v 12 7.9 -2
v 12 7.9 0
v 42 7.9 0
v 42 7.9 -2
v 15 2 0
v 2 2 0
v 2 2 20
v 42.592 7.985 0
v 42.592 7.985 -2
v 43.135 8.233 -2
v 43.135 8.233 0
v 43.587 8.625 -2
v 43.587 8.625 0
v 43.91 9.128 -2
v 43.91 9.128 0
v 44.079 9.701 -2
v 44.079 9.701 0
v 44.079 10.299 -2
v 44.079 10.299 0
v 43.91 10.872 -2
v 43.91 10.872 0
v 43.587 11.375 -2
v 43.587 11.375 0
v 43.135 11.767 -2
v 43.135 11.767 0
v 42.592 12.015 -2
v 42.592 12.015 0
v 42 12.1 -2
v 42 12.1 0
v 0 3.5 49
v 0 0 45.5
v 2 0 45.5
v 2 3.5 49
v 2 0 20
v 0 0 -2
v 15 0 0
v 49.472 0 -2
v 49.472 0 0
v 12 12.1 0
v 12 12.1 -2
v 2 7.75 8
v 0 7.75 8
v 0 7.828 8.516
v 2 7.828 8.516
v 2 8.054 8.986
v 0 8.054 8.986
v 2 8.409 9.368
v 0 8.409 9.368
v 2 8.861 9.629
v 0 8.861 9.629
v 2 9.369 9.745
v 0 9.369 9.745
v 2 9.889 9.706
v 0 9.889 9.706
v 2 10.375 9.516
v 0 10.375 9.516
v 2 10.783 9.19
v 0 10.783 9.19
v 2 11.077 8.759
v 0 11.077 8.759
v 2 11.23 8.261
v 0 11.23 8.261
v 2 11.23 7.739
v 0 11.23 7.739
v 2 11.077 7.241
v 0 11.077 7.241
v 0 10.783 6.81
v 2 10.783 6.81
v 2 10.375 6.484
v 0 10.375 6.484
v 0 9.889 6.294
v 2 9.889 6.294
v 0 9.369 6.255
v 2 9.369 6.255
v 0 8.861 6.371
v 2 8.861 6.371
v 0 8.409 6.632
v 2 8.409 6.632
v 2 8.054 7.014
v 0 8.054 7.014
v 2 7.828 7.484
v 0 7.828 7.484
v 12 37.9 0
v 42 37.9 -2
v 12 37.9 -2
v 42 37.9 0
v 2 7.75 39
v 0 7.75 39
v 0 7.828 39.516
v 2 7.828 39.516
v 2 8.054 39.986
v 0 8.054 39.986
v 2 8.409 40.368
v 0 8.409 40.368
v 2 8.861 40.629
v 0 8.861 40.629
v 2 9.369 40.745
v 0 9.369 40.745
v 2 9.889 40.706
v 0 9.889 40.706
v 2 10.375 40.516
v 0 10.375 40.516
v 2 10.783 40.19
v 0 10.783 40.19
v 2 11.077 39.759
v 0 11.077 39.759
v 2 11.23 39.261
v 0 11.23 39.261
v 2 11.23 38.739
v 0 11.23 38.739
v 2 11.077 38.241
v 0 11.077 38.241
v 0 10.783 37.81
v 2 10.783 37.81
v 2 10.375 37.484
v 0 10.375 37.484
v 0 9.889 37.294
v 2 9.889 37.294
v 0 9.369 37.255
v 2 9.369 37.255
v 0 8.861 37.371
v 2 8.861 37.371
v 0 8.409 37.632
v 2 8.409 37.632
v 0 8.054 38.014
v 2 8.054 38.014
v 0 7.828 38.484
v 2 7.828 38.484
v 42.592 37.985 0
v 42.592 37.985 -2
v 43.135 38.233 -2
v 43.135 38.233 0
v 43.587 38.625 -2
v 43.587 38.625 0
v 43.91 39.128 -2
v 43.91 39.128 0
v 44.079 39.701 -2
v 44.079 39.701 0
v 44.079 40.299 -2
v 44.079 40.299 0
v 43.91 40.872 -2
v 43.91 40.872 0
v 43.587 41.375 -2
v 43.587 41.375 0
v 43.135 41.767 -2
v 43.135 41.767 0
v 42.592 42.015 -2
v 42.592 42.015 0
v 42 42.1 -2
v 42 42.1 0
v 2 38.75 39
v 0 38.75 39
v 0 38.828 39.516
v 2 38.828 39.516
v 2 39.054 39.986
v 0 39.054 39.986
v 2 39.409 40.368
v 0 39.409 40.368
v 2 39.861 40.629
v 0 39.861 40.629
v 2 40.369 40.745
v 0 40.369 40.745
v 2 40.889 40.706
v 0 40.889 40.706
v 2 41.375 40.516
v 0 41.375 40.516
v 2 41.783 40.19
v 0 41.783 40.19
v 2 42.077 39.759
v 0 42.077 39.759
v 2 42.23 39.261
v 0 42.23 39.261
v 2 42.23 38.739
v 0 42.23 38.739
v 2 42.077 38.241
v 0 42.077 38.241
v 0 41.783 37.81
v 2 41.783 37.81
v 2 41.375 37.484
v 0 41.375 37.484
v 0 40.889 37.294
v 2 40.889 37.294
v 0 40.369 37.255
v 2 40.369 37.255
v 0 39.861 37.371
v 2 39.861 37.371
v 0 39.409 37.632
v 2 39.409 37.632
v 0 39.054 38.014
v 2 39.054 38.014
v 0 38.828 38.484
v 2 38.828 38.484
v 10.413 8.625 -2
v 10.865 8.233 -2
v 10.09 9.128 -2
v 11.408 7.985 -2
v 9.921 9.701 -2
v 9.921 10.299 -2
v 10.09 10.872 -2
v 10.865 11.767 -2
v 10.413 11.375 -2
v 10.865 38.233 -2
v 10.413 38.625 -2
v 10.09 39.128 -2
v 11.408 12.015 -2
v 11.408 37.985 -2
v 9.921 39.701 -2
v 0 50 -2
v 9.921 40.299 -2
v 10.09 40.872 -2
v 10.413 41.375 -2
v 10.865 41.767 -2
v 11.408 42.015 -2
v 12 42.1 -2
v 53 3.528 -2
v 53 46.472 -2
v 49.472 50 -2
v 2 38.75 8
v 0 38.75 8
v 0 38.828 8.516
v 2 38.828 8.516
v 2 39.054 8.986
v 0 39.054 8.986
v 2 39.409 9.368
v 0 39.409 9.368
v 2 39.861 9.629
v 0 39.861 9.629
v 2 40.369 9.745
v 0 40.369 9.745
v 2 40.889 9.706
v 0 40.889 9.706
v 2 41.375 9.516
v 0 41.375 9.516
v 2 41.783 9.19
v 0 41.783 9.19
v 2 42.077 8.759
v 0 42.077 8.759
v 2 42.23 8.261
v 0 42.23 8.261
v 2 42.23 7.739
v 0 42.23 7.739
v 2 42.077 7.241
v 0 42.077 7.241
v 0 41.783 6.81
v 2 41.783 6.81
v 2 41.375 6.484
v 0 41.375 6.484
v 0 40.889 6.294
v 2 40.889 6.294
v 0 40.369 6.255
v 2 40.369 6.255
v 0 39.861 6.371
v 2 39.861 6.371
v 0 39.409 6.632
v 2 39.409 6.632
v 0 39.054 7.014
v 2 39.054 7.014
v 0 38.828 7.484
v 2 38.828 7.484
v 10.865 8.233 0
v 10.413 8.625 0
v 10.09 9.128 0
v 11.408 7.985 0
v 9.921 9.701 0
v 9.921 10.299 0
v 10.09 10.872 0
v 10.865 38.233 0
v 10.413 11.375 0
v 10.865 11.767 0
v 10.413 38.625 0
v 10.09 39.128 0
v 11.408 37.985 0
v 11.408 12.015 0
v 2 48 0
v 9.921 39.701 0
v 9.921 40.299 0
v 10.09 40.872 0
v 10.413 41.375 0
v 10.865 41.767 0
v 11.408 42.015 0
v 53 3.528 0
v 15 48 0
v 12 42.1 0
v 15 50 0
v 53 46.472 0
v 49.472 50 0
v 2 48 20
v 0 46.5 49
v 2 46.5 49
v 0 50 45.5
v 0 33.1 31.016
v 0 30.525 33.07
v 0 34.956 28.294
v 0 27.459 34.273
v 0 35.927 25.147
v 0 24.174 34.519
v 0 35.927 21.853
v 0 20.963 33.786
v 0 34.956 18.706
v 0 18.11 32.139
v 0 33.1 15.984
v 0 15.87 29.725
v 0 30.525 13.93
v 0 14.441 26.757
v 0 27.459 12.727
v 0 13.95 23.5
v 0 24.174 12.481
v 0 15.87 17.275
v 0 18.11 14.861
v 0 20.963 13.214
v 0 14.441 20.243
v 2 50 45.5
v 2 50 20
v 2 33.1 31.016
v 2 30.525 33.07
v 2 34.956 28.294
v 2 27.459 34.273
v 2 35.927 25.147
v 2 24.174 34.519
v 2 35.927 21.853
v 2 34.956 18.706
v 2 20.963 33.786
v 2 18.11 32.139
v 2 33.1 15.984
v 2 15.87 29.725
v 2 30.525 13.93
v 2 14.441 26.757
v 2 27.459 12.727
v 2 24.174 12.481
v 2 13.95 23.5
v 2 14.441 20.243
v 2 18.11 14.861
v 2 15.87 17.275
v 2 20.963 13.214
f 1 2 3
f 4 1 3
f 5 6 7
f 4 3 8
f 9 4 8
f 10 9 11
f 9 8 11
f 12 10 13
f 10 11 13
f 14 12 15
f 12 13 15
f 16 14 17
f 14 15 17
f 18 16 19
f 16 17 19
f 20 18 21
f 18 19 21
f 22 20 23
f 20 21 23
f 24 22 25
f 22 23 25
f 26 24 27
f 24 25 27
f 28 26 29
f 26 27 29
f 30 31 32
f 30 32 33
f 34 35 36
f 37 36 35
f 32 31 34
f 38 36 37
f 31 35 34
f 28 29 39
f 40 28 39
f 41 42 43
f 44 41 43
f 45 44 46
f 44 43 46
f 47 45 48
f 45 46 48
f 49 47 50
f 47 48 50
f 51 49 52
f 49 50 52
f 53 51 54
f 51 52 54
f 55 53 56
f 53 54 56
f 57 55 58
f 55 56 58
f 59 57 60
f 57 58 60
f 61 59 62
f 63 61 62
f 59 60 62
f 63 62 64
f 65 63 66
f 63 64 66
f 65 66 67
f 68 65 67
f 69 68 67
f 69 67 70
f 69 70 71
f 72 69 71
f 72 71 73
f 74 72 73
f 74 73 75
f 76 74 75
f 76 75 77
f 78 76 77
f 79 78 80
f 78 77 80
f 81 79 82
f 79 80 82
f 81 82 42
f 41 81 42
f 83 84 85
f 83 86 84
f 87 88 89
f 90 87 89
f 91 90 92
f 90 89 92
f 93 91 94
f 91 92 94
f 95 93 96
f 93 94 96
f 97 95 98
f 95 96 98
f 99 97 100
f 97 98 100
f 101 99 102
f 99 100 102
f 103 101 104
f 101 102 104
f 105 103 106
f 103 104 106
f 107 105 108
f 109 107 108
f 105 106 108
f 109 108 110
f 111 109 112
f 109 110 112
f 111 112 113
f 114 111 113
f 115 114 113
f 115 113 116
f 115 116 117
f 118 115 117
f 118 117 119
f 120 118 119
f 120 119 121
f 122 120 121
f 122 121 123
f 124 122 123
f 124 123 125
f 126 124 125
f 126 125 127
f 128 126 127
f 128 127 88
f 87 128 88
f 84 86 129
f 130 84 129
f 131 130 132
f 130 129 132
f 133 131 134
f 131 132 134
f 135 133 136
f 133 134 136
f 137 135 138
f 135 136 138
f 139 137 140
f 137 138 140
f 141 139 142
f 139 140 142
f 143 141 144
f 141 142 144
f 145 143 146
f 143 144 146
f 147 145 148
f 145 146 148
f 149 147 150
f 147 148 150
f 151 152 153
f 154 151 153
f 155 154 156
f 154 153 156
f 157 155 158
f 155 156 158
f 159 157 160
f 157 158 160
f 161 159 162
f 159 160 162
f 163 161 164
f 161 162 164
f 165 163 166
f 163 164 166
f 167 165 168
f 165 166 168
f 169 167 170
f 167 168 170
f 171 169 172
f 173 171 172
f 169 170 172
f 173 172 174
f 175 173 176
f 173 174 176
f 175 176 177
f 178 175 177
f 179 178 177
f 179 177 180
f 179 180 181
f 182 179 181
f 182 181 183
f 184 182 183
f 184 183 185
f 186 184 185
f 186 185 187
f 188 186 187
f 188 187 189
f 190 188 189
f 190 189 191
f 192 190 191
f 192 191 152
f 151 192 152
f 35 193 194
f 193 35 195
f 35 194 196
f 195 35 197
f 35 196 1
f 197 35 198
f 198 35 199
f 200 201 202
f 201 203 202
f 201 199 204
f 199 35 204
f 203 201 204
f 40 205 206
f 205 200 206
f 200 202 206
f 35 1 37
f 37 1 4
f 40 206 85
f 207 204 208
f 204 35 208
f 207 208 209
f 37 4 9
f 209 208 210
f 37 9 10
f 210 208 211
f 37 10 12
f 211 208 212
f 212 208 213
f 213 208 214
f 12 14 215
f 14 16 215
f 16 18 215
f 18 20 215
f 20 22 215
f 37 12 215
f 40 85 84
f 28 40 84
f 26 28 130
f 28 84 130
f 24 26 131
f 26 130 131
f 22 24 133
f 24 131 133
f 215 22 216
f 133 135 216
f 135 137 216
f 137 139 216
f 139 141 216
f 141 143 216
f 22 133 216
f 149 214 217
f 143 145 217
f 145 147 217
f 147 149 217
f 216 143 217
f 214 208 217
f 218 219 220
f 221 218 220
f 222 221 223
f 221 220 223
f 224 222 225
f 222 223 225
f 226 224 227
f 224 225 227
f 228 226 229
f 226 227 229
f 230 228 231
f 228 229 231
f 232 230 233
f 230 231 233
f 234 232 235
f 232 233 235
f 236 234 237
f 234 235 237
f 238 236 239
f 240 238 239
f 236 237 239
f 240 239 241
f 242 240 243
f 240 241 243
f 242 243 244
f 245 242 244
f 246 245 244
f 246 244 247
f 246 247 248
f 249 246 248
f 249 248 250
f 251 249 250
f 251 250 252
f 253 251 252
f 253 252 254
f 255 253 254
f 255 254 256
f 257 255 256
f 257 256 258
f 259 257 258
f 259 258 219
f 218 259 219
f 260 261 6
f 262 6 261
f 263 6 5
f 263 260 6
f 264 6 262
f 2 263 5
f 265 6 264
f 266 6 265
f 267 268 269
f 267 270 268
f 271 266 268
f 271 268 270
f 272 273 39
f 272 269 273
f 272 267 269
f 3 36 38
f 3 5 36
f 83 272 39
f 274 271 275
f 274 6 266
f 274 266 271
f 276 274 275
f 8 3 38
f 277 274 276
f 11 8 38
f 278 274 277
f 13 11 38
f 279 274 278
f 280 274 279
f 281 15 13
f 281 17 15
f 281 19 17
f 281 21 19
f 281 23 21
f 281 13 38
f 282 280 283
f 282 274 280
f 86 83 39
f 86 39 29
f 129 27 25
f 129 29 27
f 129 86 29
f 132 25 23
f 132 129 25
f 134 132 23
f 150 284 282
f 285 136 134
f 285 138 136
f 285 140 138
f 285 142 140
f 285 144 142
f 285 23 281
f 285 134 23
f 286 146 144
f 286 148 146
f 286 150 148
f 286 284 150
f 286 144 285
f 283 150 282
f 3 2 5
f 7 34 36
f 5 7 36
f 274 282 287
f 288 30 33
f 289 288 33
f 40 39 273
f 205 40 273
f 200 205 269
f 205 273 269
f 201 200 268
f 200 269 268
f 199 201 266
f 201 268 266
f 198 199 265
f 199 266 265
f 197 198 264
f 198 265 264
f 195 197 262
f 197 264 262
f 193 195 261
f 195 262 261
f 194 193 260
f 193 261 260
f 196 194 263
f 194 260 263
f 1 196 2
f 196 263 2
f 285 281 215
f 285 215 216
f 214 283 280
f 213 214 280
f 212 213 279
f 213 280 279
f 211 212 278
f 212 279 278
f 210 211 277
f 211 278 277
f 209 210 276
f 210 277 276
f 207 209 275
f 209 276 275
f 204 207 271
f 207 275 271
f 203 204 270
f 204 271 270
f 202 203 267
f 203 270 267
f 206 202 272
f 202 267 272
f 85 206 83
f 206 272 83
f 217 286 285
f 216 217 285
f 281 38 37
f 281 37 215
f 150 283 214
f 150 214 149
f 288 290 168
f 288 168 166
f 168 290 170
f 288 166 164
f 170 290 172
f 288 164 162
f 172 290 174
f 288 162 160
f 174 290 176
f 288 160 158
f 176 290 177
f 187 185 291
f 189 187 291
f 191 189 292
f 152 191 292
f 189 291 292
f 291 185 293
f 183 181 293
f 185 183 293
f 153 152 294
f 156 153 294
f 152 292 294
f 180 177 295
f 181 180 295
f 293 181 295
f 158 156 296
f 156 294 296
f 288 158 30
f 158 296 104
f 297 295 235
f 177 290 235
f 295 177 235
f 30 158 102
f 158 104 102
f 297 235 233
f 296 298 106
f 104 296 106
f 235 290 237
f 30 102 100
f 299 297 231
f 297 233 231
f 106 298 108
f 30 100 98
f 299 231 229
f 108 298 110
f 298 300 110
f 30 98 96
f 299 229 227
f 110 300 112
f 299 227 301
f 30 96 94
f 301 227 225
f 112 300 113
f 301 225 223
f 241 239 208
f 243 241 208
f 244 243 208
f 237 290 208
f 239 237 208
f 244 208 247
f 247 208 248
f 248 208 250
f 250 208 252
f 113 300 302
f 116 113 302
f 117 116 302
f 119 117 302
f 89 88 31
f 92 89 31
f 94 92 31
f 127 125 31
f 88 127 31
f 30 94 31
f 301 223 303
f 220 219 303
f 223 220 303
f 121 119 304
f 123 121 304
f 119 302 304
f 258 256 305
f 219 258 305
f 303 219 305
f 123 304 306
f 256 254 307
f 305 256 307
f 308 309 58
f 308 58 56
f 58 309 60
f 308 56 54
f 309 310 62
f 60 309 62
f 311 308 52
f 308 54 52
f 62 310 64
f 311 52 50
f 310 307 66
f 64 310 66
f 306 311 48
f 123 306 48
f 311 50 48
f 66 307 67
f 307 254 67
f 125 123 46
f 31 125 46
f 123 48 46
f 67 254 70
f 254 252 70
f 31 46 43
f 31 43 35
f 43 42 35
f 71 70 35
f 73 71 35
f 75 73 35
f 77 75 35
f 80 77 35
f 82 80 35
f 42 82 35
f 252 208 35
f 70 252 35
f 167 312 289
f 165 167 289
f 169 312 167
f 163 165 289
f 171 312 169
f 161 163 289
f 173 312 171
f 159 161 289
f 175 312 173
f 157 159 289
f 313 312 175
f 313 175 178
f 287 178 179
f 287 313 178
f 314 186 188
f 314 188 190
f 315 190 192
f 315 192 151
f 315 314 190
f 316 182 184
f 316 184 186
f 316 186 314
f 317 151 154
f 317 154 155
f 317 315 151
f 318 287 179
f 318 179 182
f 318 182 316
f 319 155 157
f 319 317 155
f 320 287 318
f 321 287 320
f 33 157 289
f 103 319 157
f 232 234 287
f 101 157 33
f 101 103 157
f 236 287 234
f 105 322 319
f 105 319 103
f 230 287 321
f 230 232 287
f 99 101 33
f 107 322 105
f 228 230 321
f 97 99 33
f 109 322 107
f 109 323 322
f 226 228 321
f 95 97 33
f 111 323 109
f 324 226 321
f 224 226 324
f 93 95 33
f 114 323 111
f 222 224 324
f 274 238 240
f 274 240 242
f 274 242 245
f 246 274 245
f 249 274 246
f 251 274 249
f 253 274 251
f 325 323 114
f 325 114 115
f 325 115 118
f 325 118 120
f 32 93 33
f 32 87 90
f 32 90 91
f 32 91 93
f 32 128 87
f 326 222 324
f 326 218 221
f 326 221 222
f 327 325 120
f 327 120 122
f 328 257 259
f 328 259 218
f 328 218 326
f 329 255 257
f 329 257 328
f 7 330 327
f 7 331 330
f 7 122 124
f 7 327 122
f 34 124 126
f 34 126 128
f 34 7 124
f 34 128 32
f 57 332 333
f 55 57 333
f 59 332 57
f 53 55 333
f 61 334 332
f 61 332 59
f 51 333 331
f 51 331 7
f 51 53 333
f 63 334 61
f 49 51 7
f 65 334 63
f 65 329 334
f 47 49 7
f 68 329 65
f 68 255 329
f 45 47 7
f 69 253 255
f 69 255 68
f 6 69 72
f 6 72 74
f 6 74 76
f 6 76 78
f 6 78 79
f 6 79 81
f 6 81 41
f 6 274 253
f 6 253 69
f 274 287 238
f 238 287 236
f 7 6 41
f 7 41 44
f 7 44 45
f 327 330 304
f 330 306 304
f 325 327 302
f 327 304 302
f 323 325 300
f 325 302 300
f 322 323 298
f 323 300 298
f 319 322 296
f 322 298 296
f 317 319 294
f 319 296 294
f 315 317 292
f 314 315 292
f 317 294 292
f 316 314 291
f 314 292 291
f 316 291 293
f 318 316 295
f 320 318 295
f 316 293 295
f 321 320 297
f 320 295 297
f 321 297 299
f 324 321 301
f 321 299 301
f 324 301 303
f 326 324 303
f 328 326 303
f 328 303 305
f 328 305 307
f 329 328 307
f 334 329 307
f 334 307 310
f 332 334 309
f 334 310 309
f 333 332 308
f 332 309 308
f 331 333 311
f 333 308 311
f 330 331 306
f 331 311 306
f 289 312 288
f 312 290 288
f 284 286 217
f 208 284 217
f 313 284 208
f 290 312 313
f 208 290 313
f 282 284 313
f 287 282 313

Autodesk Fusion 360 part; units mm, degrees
sketch "Sketch1" plane through (0, 0, 0) normal (0, 0, 1) x (1, 0, 0)
  line L0 (0, 0) -> (53, 0)
  line L1 (53, 0) -> (53, 50)
  line L2 (53, 50) -> (0, 50)
  line L3 (0, 50) -> (0, 0)
  line L4 (12, 7.9) -> (42, 7.9)
  arc A0 (42, 7.9) -> (42, 12.1) centre (42, 10) ccw
  line L5 (42, 12.1) -> (12, 12.1)
  arc A1 (12, 12.1) -> (12, 7.9) centre (12, 10) ccw
  line L6 (12, 10) -> (42, 10) construction
  line L7 (0, 25) -> (53, 25) construction
  line L8 (42, 37.9) -> (12, 37.9)
  arc A2 (12, 42.1) -> (12, 37.9) centre (12, 40) ccw
  line L9 (12, 42.1) -> (42, 42.1)
  arc A3 (42, 37.9) -> (42, 42.1) centre (42, 40) ccw
  line L10 (49.4724, 50) -> (53.0079, 46.4645)
  line L11 (49.4724, 50) -> (52.8478, 50) construction
  line L12 (49.4724, 0) -> (53.0079, 3.5355)
  line L13 (0, 50) -> (2, 50)
  line L14 (2, 50) -> (2, 0)
  line L15 (2, 0) -> (0, 0)
  line L16 (0, 0) -> (0, 50)
  dimension "d1" = 53
  dimension "d2" = 50
  dimension "d3" = 4.2
  dimension "d4" = 11
  dimension "d5" = 10
  dimension "d6" = 30
  dimension "d9" = 45
  dimension "d10" = 5
extrude "Extrude1" add sketch "Sketch1" against normal blind 2 contours L0 L2 L3 L13 L14 L15 L16 | L0 L1 L2 L10 L12 L14
extrude "Extrude2" add sketch "Sketch1" along normal blind 49 contours L0 L2 L3 L13 L14 L15 L16
sketch "Sketch2" plane through (0, 0, 0) normal (-1, 0, 0) x (0, -1, 0)
  line L0 (-50, 49) -> (-50, -2)
  line L1 (-50, -2) -> (0, -2)
  line L2 (0, -2) -> (0, 49)
  line L3 (0, 49) -> (-50, 49)
  circle A0 centre (-25, 23.5) radius 11.05
  line L4 (-40.5, 39) -> (-9.5, 39) construction
  line L5 (-9.5, 39) -> (-9.5, 8) construction
  line L6 (-9.5, 8) -> (-40.5, 8) construction
  line L7 (-40.5, 8) -> (-40.5, 39) construction
  line L8 (-40.5, 39) -> (-9.5, 8) construction
  line L9 (-9.5, 39) -> (-40.5, 8) construction
  circle A1 centre (-40.5, 39) radius 1.75
  circle A2 centre (-9.5, 39) radius 1.75
  circle A3 centre (-40.5, 8) radius 1.75
  circle A4 centre (-9.5, 8) radius 1.75
  line L10 (-50, 45.4997) -> (-46.4645, 49.0353)
  line L11 (-50, 45.4997) -> (-45, 45.4997) construction
  line L12 (-25, 49) -> (-25, -2)
  line L13 (0, 45.4997) -> (-3.5355, 49.0353)
  point P0 (-25, 23.5)
  dimension "d13" = 22.1
  dimension "d14" = 31
  dimension "d15" = 31
  dimension "d16" = 3.5
  dimension "d17" = 3.5
  dimension "d18" = 3.5
  dimension "d19" = 3.5
  dimension "d20" = 45
  dimension "d21" = 5
extrude "Extrude3" cut sketch "Sketch2" against normal blind 2 contours L0 L3 L10 | L2 L3 L13 | A0 L12 | A0 L12 | A1 | A2 | A3 | A4
sketch "Sketch3" plane through (0, 0, 0) normal (0, -1, 0) x (1, 0, 0)
  line L0 (2, 45.4997) -> (0, 45.4997)
  line L1 (0, 45.4997) -> (0, -2)
  line L2 (0, -2) -> (49.4724, -2)
  line L3 (49.4724, -2) -> (49.4724, 0)
  line L4 (49.4724, 0) -> (2, 0)
  line L5 (2, 0) -> (2, 45.4997)
  line L6 (2, 0) -> (2, 20) construction
  line L7 (2, 0) -> (15, 0) construction
  line L8 (2, 20) -> (15, 0)
  dimension "d24" = 20
  dimension "d25" = 13
extrude "Extrude4" add sketch "Sketch3" against normal blind 2 contours L4 L5 L8
ref_plane "WorkPlane1" through (24.7362, 25, 21.7499) normal (0, -1, 0) x (-1, 0, 0)
mirror "Mirror1" about plane through (24.7362, 25, 21.7499) normal (0, -1, 0) of "Extrude4"
